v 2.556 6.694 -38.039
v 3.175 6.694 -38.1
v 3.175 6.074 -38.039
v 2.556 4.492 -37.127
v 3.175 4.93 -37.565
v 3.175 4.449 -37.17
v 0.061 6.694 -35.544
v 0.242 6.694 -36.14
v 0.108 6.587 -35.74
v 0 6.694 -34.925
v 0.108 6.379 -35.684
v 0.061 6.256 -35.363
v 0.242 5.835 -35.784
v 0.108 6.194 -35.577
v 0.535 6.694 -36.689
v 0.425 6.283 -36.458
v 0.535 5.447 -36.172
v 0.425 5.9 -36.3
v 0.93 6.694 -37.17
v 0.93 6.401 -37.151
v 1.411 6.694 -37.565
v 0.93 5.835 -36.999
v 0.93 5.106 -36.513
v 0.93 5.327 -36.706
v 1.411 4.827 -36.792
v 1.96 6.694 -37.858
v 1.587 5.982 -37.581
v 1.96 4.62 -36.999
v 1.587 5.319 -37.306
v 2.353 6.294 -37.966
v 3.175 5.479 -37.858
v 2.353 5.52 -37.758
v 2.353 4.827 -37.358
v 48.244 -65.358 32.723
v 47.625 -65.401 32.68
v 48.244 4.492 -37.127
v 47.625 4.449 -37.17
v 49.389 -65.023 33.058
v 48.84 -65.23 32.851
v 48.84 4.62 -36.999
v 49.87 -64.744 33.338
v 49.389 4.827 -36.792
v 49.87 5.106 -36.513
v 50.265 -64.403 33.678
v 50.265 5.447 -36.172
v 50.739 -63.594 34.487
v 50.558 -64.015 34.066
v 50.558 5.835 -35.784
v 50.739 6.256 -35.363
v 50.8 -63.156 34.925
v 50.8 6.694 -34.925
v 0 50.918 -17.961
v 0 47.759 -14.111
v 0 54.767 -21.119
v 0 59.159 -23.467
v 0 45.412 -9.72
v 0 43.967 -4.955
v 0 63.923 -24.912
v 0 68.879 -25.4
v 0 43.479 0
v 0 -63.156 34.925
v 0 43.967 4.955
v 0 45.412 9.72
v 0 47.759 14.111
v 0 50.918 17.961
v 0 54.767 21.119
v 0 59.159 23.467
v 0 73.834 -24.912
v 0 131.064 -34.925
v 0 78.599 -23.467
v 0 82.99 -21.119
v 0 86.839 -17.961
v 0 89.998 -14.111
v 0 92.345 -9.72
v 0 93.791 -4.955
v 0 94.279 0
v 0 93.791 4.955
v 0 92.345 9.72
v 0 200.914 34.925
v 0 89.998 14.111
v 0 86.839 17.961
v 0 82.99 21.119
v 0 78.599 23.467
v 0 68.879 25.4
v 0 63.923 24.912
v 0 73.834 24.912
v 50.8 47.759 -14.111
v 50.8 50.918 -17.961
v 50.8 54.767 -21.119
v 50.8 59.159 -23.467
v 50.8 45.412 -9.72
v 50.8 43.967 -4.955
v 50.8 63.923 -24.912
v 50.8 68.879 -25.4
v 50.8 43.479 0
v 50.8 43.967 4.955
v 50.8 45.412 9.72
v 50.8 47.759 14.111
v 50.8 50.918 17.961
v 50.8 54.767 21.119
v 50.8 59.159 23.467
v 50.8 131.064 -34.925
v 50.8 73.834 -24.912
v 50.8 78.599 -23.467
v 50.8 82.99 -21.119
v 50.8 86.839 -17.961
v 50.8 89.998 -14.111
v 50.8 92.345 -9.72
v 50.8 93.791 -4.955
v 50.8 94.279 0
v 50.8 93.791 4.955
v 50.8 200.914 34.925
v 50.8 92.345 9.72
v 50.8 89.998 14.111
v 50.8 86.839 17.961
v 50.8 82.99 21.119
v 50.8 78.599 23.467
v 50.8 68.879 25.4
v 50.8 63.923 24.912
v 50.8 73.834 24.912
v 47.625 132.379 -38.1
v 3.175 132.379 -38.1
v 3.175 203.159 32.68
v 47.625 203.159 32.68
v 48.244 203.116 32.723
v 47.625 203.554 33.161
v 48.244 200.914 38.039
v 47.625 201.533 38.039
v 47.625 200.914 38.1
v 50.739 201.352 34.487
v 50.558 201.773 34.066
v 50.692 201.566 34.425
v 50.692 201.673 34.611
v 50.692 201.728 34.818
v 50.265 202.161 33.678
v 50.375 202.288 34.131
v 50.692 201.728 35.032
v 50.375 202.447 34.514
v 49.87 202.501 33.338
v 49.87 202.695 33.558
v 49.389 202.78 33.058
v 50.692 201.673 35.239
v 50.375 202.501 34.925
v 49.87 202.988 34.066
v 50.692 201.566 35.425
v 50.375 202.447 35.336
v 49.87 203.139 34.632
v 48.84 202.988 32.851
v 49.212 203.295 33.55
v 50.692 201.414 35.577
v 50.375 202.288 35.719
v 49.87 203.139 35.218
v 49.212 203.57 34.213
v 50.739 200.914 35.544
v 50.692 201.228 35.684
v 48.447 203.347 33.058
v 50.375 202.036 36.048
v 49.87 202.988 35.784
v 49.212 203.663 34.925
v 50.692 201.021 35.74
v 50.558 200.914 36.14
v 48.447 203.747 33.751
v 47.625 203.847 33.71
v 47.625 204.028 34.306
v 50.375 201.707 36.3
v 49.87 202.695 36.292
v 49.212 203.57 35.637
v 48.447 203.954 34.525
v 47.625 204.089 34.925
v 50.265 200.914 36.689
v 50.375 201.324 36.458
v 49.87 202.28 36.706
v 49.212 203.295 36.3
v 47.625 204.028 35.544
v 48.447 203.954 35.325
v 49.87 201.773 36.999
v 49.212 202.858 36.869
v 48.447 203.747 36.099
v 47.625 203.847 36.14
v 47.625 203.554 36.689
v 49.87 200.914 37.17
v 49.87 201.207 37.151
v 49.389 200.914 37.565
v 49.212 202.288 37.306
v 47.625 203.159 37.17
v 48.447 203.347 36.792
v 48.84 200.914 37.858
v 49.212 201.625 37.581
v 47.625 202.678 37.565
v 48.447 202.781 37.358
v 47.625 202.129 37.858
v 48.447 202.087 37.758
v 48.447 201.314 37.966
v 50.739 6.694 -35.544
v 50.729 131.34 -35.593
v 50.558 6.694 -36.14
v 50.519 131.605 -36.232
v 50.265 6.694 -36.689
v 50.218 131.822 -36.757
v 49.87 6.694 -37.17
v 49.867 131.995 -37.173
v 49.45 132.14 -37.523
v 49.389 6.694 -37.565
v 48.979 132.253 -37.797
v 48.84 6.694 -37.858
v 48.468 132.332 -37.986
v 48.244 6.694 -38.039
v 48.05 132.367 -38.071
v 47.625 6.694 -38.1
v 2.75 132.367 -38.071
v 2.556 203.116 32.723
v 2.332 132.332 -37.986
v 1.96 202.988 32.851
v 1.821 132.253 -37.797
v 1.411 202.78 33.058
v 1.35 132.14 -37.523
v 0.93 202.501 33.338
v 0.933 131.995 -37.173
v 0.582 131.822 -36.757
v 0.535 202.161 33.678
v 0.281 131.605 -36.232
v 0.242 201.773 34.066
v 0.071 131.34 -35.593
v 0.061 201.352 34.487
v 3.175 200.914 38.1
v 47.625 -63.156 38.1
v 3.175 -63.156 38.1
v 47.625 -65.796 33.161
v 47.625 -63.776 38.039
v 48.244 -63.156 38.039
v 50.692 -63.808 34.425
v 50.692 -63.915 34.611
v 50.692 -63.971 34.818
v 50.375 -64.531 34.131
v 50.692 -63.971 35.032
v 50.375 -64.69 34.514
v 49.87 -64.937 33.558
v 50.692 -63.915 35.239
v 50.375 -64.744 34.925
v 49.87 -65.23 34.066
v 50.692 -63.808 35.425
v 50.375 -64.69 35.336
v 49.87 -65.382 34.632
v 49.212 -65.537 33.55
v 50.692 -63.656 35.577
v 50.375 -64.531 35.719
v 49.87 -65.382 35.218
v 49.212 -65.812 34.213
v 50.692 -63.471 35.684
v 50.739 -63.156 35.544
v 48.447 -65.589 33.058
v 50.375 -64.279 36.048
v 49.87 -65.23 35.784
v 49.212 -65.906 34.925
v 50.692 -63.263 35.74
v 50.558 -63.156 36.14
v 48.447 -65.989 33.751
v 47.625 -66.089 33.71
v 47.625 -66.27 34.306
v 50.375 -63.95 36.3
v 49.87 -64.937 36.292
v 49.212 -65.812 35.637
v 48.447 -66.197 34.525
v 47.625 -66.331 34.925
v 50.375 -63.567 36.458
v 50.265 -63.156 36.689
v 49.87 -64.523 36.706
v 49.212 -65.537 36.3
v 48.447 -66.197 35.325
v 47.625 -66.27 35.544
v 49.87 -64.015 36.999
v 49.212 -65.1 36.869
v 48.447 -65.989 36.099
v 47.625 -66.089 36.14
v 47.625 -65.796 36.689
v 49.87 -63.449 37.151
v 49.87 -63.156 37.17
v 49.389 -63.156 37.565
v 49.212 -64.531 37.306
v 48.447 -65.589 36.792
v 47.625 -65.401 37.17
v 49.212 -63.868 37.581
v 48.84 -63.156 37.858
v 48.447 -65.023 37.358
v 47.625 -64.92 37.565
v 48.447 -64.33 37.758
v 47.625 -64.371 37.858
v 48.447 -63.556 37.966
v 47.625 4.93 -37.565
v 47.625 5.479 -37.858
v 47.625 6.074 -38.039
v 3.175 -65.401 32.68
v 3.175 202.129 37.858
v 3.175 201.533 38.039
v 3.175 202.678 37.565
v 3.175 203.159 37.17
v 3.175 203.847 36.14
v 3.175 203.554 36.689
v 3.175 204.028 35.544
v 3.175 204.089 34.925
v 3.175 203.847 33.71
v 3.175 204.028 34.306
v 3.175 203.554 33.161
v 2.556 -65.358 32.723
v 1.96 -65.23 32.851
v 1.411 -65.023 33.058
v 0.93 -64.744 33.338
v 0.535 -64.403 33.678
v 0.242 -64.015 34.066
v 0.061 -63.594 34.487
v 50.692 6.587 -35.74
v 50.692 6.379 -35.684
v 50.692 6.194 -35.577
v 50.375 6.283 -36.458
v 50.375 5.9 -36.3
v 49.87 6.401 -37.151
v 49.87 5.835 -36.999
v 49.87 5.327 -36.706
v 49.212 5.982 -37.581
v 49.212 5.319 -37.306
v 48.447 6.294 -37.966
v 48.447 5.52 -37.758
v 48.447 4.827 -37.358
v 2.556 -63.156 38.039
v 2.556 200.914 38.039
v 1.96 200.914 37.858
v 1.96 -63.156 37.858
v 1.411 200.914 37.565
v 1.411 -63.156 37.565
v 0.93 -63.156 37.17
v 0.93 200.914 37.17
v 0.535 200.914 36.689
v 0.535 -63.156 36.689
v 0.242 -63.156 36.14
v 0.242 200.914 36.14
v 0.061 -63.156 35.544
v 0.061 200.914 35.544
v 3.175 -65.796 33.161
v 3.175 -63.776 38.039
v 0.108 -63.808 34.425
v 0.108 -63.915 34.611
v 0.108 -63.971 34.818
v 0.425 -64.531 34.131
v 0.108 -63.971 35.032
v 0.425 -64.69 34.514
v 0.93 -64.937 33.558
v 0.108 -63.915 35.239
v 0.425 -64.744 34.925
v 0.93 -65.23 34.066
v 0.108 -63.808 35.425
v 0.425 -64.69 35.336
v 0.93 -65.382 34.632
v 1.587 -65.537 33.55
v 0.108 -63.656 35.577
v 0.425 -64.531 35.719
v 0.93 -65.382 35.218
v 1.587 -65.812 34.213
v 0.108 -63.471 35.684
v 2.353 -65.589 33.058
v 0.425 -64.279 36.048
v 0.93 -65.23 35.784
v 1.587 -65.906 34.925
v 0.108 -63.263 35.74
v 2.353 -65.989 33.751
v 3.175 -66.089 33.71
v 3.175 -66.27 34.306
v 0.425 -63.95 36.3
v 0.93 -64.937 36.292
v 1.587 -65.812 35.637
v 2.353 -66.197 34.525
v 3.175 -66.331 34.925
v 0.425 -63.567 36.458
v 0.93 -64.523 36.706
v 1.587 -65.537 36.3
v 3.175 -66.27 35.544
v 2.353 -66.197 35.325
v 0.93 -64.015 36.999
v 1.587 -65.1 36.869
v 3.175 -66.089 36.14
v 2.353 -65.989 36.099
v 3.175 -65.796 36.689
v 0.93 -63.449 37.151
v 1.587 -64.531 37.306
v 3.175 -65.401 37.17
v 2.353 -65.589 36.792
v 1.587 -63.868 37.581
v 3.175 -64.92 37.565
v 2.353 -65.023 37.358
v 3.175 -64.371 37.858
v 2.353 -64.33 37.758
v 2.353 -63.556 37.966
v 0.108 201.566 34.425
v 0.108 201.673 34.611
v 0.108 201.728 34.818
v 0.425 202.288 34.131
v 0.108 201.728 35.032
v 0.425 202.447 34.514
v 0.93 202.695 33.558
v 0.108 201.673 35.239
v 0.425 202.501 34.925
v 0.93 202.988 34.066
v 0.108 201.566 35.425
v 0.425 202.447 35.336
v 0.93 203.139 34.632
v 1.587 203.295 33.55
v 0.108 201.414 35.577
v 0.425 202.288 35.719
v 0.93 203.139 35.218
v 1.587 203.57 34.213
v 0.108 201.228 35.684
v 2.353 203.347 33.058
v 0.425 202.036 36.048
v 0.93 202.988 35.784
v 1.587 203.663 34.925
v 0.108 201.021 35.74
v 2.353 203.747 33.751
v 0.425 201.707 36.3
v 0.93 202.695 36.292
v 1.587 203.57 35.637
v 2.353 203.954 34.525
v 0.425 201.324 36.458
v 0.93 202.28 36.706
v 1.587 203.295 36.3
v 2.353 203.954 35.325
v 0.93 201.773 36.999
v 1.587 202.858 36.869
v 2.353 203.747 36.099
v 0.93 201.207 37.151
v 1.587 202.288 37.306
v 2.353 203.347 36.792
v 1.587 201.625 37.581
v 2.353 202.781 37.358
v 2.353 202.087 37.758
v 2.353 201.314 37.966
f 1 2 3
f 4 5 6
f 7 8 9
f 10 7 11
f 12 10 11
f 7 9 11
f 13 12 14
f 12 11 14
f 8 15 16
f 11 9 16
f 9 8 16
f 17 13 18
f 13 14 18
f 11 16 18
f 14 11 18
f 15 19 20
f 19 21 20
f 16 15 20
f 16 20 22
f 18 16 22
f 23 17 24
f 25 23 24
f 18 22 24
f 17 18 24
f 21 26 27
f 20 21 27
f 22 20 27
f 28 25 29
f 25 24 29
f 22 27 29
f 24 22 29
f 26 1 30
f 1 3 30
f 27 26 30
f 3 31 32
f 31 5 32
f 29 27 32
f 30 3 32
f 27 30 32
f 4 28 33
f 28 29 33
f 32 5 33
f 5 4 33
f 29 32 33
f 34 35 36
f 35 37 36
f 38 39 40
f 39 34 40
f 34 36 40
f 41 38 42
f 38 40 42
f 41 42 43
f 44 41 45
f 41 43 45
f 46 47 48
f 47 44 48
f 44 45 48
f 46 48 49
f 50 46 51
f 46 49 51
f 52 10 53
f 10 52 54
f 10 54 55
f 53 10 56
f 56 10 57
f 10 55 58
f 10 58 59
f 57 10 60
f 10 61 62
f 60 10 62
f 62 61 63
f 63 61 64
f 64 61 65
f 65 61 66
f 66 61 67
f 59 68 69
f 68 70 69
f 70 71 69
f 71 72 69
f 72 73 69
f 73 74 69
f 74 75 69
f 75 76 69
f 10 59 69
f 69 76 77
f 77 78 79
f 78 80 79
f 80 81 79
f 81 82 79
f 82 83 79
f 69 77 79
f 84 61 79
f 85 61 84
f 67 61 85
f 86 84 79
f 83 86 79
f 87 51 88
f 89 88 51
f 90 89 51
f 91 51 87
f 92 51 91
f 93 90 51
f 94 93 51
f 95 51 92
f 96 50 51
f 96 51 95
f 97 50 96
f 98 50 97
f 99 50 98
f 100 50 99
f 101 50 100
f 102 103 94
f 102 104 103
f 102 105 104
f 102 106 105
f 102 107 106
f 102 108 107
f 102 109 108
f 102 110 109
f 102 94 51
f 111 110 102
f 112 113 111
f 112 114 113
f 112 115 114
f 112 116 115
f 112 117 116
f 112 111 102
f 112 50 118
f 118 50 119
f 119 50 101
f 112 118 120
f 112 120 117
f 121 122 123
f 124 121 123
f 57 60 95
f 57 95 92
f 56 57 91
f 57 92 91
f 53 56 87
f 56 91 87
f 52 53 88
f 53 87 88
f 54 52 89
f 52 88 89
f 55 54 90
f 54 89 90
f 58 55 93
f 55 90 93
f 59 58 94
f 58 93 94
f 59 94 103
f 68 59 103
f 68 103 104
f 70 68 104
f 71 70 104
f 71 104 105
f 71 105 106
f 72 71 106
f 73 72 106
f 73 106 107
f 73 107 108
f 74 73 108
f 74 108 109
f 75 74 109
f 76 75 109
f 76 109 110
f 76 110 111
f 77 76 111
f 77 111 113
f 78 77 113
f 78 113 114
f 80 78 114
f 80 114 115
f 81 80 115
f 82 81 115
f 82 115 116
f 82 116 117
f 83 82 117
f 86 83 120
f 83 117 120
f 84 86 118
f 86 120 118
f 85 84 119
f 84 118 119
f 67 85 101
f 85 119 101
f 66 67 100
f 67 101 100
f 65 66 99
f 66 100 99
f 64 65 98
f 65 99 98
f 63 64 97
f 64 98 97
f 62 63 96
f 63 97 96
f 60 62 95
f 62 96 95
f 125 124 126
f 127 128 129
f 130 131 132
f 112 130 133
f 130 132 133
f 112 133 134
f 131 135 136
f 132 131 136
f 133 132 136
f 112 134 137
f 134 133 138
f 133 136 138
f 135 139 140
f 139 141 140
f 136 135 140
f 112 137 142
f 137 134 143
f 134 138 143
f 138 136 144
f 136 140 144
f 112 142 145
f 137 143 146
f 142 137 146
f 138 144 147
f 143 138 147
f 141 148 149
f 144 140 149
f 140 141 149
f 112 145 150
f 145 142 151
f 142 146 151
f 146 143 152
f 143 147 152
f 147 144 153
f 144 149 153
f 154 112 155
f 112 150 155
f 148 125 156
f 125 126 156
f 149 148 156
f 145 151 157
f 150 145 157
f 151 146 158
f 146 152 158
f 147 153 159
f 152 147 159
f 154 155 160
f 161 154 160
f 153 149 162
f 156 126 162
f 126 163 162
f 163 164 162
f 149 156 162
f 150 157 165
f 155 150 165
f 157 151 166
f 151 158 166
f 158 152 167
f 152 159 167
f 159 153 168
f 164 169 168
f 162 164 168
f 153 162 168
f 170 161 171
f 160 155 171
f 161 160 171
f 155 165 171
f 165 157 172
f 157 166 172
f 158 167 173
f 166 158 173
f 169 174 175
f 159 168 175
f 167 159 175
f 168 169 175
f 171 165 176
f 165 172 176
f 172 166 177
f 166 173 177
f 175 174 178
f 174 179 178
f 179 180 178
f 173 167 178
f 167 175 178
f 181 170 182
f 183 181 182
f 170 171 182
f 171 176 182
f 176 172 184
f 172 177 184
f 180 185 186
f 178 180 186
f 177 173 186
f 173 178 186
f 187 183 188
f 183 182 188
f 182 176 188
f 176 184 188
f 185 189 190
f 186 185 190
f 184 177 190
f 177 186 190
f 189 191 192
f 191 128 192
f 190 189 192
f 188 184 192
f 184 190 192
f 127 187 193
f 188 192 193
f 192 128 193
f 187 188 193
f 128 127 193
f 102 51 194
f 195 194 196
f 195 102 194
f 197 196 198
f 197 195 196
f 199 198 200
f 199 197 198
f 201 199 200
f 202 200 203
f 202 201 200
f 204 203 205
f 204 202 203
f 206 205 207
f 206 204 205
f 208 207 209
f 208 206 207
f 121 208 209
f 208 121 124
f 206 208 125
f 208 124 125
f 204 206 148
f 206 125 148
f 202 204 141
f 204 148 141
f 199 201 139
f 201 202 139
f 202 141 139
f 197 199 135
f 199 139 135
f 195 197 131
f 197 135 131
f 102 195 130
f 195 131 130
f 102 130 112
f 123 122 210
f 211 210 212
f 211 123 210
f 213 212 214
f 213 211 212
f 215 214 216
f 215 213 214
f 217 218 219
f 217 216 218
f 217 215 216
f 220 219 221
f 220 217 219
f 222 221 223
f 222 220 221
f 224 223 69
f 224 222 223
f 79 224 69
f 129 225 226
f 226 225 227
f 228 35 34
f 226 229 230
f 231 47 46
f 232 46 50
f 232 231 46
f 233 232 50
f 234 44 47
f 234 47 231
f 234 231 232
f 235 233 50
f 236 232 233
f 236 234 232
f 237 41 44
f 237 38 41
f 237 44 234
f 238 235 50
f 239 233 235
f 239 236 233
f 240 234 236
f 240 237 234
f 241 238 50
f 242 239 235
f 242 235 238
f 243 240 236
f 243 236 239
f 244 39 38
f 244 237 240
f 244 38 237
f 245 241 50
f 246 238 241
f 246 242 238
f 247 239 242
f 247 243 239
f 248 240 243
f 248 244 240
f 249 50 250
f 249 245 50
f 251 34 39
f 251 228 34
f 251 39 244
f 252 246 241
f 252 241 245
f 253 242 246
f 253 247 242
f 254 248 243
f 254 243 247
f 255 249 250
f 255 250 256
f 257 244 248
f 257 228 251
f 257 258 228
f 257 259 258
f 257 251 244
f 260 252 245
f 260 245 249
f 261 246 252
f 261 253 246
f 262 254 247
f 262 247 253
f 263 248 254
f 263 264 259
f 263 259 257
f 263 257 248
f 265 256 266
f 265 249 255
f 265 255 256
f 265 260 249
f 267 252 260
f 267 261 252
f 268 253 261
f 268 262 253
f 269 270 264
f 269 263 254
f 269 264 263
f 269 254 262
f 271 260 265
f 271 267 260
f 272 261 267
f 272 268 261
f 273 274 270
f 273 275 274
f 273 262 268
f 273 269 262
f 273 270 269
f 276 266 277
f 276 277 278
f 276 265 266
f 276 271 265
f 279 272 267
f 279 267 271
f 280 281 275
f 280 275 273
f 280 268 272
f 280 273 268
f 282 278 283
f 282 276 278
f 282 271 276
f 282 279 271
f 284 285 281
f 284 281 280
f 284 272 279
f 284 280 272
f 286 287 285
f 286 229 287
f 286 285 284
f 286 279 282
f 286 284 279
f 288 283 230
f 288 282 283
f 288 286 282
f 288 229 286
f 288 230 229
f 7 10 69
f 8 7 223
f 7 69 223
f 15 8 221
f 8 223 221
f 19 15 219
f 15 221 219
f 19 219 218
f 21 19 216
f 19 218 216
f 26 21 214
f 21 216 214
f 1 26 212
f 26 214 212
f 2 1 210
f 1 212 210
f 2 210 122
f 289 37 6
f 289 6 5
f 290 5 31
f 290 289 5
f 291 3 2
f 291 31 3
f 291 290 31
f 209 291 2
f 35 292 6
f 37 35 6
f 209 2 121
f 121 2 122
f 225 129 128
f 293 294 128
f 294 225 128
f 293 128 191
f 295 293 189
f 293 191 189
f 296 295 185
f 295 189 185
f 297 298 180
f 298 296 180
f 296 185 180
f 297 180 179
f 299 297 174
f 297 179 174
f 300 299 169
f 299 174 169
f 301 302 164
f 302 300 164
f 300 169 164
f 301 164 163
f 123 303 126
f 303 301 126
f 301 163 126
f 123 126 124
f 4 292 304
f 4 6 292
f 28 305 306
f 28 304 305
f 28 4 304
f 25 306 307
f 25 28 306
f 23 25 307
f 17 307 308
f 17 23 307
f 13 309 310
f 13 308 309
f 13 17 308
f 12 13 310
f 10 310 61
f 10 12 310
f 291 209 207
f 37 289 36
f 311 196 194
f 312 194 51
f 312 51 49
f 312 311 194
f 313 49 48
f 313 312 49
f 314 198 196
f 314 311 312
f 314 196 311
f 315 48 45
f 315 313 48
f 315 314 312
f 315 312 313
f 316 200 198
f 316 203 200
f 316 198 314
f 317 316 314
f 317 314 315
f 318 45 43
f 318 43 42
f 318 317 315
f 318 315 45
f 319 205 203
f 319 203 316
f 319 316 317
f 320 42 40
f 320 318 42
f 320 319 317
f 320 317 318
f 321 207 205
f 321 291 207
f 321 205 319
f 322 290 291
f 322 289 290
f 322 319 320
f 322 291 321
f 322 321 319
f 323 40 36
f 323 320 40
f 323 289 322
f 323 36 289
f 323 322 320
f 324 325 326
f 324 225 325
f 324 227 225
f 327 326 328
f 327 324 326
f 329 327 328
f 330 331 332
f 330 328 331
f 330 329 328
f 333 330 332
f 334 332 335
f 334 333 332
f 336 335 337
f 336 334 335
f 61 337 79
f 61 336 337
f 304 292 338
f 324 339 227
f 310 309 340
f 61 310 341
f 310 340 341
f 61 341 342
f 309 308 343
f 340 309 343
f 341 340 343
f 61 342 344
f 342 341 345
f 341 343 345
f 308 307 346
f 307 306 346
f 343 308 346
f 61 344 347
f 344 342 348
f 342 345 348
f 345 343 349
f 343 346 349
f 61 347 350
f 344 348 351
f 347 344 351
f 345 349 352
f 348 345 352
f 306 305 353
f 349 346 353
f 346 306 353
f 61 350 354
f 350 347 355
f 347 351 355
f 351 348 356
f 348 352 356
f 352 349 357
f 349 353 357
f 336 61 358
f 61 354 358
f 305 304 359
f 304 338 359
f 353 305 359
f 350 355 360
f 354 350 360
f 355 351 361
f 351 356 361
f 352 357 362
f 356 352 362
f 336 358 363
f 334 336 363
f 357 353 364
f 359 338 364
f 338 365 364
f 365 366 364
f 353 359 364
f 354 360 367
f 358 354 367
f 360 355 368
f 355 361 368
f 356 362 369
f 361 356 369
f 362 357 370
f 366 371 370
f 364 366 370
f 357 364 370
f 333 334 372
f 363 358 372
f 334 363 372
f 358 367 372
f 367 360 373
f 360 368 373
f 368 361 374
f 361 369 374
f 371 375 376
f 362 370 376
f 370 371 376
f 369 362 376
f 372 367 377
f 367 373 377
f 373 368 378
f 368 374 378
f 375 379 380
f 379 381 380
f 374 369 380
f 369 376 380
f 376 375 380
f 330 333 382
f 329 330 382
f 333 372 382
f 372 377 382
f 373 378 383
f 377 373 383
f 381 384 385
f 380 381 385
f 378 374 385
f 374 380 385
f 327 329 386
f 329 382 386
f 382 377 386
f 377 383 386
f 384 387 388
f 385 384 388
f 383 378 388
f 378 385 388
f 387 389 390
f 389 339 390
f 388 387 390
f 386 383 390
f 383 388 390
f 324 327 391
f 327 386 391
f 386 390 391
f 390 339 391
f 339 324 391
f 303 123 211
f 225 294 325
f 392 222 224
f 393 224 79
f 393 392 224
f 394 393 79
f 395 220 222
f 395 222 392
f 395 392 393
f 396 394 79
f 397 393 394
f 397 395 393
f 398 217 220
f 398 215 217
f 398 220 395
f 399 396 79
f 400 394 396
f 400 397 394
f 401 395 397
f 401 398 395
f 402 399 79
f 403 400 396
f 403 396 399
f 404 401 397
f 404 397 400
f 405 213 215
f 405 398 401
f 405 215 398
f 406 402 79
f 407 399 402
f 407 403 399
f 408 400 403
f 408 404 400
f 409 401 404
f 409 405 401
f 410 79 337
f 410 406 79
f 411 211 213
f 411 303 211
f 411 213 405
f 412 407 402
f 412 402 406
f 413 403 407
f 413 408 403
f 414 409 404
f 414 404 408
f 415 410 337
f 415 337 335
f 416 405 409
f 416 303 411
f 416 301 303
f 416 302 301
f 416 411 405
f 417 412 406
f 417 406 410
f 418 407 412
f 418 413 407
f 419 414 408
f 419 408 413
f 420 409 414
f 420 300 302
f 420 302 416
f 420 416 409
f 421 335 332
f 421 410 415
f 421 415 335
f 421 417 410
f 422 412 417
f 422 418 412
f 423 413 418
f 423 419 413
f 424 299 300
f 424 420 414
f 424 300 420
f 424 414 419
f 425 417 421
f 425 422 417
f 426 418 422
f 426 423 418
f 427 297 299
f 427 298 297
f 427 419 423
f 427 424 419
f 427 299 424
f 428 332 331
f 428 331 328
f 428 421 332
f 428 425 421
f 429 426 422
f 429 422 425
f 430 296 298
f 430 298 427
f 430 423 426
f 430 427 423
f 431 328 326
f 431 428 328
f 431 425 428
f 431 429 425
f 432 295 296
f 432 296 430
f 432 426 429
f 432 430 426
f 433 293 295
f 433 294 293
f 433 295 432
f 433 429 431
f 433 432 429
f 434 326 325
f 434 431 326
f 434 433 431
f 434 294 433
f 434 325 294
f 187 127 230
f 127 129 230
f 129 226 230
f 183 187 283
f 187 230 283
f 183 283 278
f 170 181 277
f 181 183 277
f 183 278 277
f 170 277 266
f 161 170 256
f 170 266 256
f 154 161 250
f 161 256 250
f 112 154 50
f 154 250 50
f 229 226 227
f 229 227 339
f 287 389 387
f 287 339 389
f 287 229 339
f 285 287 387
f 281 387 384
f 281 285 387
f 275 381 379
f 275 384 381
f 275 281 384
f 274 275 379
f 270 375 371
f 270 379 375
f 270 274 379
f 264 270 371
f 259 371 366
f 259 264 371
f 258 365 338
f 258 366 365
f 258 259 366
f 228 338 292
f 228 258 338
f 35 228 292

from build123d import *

# Parameters (mm, degrees)
F1_DEPTH = 50.8
F3_D     = 50.8
F4_R     = 3.175


# Not quite as in the source:
# - a feature of the source that left no trace in its solid (it failed there, or was rolled back) is left out


with BuildPart() as f1:
    # F0 (on Right) → F1 (new body)
    with BuildSketch(Plane.YZ):
        Polygon((208.5787526399, 38.1), (-70.8212473601, 38.1), (5.3787526399, -38.1), (132.3787526399, -38.1), align=None)
    extrude(amount=F1_DEPTH)

    # F3 (through all)
    with Locations(Plane(origin=(0, 0, 0), x_dir=(0, 1, 0), z_dir=(-1, 0, 0))):
        with Locations((68.8787526399, 0)):
            Hole(F3_D / 2)

    # F4
    f4_edges = [f1.edges().sort_by_distance(p)[0] for p in [
        (0, 68.878753, 38.1),
        (25.4, 5.378753, -38.1),
        (0, 68.878753, -38.1),
        (50.8, 68.878753, -38.1),
        (25.4, -70.821247, 38.1),
        (0, -32.721247, 0),
        (50.8, -32.721247, 0),
        (25.4, 208.578753, 38.1),
        (0, 170.478753, 0),
        (50.8, 170.478753, 0),
        (50.8, 68.878753, 38.1),
    ]]
    fillet(f4_edges, radius=F4_R)


solid = f1.part
